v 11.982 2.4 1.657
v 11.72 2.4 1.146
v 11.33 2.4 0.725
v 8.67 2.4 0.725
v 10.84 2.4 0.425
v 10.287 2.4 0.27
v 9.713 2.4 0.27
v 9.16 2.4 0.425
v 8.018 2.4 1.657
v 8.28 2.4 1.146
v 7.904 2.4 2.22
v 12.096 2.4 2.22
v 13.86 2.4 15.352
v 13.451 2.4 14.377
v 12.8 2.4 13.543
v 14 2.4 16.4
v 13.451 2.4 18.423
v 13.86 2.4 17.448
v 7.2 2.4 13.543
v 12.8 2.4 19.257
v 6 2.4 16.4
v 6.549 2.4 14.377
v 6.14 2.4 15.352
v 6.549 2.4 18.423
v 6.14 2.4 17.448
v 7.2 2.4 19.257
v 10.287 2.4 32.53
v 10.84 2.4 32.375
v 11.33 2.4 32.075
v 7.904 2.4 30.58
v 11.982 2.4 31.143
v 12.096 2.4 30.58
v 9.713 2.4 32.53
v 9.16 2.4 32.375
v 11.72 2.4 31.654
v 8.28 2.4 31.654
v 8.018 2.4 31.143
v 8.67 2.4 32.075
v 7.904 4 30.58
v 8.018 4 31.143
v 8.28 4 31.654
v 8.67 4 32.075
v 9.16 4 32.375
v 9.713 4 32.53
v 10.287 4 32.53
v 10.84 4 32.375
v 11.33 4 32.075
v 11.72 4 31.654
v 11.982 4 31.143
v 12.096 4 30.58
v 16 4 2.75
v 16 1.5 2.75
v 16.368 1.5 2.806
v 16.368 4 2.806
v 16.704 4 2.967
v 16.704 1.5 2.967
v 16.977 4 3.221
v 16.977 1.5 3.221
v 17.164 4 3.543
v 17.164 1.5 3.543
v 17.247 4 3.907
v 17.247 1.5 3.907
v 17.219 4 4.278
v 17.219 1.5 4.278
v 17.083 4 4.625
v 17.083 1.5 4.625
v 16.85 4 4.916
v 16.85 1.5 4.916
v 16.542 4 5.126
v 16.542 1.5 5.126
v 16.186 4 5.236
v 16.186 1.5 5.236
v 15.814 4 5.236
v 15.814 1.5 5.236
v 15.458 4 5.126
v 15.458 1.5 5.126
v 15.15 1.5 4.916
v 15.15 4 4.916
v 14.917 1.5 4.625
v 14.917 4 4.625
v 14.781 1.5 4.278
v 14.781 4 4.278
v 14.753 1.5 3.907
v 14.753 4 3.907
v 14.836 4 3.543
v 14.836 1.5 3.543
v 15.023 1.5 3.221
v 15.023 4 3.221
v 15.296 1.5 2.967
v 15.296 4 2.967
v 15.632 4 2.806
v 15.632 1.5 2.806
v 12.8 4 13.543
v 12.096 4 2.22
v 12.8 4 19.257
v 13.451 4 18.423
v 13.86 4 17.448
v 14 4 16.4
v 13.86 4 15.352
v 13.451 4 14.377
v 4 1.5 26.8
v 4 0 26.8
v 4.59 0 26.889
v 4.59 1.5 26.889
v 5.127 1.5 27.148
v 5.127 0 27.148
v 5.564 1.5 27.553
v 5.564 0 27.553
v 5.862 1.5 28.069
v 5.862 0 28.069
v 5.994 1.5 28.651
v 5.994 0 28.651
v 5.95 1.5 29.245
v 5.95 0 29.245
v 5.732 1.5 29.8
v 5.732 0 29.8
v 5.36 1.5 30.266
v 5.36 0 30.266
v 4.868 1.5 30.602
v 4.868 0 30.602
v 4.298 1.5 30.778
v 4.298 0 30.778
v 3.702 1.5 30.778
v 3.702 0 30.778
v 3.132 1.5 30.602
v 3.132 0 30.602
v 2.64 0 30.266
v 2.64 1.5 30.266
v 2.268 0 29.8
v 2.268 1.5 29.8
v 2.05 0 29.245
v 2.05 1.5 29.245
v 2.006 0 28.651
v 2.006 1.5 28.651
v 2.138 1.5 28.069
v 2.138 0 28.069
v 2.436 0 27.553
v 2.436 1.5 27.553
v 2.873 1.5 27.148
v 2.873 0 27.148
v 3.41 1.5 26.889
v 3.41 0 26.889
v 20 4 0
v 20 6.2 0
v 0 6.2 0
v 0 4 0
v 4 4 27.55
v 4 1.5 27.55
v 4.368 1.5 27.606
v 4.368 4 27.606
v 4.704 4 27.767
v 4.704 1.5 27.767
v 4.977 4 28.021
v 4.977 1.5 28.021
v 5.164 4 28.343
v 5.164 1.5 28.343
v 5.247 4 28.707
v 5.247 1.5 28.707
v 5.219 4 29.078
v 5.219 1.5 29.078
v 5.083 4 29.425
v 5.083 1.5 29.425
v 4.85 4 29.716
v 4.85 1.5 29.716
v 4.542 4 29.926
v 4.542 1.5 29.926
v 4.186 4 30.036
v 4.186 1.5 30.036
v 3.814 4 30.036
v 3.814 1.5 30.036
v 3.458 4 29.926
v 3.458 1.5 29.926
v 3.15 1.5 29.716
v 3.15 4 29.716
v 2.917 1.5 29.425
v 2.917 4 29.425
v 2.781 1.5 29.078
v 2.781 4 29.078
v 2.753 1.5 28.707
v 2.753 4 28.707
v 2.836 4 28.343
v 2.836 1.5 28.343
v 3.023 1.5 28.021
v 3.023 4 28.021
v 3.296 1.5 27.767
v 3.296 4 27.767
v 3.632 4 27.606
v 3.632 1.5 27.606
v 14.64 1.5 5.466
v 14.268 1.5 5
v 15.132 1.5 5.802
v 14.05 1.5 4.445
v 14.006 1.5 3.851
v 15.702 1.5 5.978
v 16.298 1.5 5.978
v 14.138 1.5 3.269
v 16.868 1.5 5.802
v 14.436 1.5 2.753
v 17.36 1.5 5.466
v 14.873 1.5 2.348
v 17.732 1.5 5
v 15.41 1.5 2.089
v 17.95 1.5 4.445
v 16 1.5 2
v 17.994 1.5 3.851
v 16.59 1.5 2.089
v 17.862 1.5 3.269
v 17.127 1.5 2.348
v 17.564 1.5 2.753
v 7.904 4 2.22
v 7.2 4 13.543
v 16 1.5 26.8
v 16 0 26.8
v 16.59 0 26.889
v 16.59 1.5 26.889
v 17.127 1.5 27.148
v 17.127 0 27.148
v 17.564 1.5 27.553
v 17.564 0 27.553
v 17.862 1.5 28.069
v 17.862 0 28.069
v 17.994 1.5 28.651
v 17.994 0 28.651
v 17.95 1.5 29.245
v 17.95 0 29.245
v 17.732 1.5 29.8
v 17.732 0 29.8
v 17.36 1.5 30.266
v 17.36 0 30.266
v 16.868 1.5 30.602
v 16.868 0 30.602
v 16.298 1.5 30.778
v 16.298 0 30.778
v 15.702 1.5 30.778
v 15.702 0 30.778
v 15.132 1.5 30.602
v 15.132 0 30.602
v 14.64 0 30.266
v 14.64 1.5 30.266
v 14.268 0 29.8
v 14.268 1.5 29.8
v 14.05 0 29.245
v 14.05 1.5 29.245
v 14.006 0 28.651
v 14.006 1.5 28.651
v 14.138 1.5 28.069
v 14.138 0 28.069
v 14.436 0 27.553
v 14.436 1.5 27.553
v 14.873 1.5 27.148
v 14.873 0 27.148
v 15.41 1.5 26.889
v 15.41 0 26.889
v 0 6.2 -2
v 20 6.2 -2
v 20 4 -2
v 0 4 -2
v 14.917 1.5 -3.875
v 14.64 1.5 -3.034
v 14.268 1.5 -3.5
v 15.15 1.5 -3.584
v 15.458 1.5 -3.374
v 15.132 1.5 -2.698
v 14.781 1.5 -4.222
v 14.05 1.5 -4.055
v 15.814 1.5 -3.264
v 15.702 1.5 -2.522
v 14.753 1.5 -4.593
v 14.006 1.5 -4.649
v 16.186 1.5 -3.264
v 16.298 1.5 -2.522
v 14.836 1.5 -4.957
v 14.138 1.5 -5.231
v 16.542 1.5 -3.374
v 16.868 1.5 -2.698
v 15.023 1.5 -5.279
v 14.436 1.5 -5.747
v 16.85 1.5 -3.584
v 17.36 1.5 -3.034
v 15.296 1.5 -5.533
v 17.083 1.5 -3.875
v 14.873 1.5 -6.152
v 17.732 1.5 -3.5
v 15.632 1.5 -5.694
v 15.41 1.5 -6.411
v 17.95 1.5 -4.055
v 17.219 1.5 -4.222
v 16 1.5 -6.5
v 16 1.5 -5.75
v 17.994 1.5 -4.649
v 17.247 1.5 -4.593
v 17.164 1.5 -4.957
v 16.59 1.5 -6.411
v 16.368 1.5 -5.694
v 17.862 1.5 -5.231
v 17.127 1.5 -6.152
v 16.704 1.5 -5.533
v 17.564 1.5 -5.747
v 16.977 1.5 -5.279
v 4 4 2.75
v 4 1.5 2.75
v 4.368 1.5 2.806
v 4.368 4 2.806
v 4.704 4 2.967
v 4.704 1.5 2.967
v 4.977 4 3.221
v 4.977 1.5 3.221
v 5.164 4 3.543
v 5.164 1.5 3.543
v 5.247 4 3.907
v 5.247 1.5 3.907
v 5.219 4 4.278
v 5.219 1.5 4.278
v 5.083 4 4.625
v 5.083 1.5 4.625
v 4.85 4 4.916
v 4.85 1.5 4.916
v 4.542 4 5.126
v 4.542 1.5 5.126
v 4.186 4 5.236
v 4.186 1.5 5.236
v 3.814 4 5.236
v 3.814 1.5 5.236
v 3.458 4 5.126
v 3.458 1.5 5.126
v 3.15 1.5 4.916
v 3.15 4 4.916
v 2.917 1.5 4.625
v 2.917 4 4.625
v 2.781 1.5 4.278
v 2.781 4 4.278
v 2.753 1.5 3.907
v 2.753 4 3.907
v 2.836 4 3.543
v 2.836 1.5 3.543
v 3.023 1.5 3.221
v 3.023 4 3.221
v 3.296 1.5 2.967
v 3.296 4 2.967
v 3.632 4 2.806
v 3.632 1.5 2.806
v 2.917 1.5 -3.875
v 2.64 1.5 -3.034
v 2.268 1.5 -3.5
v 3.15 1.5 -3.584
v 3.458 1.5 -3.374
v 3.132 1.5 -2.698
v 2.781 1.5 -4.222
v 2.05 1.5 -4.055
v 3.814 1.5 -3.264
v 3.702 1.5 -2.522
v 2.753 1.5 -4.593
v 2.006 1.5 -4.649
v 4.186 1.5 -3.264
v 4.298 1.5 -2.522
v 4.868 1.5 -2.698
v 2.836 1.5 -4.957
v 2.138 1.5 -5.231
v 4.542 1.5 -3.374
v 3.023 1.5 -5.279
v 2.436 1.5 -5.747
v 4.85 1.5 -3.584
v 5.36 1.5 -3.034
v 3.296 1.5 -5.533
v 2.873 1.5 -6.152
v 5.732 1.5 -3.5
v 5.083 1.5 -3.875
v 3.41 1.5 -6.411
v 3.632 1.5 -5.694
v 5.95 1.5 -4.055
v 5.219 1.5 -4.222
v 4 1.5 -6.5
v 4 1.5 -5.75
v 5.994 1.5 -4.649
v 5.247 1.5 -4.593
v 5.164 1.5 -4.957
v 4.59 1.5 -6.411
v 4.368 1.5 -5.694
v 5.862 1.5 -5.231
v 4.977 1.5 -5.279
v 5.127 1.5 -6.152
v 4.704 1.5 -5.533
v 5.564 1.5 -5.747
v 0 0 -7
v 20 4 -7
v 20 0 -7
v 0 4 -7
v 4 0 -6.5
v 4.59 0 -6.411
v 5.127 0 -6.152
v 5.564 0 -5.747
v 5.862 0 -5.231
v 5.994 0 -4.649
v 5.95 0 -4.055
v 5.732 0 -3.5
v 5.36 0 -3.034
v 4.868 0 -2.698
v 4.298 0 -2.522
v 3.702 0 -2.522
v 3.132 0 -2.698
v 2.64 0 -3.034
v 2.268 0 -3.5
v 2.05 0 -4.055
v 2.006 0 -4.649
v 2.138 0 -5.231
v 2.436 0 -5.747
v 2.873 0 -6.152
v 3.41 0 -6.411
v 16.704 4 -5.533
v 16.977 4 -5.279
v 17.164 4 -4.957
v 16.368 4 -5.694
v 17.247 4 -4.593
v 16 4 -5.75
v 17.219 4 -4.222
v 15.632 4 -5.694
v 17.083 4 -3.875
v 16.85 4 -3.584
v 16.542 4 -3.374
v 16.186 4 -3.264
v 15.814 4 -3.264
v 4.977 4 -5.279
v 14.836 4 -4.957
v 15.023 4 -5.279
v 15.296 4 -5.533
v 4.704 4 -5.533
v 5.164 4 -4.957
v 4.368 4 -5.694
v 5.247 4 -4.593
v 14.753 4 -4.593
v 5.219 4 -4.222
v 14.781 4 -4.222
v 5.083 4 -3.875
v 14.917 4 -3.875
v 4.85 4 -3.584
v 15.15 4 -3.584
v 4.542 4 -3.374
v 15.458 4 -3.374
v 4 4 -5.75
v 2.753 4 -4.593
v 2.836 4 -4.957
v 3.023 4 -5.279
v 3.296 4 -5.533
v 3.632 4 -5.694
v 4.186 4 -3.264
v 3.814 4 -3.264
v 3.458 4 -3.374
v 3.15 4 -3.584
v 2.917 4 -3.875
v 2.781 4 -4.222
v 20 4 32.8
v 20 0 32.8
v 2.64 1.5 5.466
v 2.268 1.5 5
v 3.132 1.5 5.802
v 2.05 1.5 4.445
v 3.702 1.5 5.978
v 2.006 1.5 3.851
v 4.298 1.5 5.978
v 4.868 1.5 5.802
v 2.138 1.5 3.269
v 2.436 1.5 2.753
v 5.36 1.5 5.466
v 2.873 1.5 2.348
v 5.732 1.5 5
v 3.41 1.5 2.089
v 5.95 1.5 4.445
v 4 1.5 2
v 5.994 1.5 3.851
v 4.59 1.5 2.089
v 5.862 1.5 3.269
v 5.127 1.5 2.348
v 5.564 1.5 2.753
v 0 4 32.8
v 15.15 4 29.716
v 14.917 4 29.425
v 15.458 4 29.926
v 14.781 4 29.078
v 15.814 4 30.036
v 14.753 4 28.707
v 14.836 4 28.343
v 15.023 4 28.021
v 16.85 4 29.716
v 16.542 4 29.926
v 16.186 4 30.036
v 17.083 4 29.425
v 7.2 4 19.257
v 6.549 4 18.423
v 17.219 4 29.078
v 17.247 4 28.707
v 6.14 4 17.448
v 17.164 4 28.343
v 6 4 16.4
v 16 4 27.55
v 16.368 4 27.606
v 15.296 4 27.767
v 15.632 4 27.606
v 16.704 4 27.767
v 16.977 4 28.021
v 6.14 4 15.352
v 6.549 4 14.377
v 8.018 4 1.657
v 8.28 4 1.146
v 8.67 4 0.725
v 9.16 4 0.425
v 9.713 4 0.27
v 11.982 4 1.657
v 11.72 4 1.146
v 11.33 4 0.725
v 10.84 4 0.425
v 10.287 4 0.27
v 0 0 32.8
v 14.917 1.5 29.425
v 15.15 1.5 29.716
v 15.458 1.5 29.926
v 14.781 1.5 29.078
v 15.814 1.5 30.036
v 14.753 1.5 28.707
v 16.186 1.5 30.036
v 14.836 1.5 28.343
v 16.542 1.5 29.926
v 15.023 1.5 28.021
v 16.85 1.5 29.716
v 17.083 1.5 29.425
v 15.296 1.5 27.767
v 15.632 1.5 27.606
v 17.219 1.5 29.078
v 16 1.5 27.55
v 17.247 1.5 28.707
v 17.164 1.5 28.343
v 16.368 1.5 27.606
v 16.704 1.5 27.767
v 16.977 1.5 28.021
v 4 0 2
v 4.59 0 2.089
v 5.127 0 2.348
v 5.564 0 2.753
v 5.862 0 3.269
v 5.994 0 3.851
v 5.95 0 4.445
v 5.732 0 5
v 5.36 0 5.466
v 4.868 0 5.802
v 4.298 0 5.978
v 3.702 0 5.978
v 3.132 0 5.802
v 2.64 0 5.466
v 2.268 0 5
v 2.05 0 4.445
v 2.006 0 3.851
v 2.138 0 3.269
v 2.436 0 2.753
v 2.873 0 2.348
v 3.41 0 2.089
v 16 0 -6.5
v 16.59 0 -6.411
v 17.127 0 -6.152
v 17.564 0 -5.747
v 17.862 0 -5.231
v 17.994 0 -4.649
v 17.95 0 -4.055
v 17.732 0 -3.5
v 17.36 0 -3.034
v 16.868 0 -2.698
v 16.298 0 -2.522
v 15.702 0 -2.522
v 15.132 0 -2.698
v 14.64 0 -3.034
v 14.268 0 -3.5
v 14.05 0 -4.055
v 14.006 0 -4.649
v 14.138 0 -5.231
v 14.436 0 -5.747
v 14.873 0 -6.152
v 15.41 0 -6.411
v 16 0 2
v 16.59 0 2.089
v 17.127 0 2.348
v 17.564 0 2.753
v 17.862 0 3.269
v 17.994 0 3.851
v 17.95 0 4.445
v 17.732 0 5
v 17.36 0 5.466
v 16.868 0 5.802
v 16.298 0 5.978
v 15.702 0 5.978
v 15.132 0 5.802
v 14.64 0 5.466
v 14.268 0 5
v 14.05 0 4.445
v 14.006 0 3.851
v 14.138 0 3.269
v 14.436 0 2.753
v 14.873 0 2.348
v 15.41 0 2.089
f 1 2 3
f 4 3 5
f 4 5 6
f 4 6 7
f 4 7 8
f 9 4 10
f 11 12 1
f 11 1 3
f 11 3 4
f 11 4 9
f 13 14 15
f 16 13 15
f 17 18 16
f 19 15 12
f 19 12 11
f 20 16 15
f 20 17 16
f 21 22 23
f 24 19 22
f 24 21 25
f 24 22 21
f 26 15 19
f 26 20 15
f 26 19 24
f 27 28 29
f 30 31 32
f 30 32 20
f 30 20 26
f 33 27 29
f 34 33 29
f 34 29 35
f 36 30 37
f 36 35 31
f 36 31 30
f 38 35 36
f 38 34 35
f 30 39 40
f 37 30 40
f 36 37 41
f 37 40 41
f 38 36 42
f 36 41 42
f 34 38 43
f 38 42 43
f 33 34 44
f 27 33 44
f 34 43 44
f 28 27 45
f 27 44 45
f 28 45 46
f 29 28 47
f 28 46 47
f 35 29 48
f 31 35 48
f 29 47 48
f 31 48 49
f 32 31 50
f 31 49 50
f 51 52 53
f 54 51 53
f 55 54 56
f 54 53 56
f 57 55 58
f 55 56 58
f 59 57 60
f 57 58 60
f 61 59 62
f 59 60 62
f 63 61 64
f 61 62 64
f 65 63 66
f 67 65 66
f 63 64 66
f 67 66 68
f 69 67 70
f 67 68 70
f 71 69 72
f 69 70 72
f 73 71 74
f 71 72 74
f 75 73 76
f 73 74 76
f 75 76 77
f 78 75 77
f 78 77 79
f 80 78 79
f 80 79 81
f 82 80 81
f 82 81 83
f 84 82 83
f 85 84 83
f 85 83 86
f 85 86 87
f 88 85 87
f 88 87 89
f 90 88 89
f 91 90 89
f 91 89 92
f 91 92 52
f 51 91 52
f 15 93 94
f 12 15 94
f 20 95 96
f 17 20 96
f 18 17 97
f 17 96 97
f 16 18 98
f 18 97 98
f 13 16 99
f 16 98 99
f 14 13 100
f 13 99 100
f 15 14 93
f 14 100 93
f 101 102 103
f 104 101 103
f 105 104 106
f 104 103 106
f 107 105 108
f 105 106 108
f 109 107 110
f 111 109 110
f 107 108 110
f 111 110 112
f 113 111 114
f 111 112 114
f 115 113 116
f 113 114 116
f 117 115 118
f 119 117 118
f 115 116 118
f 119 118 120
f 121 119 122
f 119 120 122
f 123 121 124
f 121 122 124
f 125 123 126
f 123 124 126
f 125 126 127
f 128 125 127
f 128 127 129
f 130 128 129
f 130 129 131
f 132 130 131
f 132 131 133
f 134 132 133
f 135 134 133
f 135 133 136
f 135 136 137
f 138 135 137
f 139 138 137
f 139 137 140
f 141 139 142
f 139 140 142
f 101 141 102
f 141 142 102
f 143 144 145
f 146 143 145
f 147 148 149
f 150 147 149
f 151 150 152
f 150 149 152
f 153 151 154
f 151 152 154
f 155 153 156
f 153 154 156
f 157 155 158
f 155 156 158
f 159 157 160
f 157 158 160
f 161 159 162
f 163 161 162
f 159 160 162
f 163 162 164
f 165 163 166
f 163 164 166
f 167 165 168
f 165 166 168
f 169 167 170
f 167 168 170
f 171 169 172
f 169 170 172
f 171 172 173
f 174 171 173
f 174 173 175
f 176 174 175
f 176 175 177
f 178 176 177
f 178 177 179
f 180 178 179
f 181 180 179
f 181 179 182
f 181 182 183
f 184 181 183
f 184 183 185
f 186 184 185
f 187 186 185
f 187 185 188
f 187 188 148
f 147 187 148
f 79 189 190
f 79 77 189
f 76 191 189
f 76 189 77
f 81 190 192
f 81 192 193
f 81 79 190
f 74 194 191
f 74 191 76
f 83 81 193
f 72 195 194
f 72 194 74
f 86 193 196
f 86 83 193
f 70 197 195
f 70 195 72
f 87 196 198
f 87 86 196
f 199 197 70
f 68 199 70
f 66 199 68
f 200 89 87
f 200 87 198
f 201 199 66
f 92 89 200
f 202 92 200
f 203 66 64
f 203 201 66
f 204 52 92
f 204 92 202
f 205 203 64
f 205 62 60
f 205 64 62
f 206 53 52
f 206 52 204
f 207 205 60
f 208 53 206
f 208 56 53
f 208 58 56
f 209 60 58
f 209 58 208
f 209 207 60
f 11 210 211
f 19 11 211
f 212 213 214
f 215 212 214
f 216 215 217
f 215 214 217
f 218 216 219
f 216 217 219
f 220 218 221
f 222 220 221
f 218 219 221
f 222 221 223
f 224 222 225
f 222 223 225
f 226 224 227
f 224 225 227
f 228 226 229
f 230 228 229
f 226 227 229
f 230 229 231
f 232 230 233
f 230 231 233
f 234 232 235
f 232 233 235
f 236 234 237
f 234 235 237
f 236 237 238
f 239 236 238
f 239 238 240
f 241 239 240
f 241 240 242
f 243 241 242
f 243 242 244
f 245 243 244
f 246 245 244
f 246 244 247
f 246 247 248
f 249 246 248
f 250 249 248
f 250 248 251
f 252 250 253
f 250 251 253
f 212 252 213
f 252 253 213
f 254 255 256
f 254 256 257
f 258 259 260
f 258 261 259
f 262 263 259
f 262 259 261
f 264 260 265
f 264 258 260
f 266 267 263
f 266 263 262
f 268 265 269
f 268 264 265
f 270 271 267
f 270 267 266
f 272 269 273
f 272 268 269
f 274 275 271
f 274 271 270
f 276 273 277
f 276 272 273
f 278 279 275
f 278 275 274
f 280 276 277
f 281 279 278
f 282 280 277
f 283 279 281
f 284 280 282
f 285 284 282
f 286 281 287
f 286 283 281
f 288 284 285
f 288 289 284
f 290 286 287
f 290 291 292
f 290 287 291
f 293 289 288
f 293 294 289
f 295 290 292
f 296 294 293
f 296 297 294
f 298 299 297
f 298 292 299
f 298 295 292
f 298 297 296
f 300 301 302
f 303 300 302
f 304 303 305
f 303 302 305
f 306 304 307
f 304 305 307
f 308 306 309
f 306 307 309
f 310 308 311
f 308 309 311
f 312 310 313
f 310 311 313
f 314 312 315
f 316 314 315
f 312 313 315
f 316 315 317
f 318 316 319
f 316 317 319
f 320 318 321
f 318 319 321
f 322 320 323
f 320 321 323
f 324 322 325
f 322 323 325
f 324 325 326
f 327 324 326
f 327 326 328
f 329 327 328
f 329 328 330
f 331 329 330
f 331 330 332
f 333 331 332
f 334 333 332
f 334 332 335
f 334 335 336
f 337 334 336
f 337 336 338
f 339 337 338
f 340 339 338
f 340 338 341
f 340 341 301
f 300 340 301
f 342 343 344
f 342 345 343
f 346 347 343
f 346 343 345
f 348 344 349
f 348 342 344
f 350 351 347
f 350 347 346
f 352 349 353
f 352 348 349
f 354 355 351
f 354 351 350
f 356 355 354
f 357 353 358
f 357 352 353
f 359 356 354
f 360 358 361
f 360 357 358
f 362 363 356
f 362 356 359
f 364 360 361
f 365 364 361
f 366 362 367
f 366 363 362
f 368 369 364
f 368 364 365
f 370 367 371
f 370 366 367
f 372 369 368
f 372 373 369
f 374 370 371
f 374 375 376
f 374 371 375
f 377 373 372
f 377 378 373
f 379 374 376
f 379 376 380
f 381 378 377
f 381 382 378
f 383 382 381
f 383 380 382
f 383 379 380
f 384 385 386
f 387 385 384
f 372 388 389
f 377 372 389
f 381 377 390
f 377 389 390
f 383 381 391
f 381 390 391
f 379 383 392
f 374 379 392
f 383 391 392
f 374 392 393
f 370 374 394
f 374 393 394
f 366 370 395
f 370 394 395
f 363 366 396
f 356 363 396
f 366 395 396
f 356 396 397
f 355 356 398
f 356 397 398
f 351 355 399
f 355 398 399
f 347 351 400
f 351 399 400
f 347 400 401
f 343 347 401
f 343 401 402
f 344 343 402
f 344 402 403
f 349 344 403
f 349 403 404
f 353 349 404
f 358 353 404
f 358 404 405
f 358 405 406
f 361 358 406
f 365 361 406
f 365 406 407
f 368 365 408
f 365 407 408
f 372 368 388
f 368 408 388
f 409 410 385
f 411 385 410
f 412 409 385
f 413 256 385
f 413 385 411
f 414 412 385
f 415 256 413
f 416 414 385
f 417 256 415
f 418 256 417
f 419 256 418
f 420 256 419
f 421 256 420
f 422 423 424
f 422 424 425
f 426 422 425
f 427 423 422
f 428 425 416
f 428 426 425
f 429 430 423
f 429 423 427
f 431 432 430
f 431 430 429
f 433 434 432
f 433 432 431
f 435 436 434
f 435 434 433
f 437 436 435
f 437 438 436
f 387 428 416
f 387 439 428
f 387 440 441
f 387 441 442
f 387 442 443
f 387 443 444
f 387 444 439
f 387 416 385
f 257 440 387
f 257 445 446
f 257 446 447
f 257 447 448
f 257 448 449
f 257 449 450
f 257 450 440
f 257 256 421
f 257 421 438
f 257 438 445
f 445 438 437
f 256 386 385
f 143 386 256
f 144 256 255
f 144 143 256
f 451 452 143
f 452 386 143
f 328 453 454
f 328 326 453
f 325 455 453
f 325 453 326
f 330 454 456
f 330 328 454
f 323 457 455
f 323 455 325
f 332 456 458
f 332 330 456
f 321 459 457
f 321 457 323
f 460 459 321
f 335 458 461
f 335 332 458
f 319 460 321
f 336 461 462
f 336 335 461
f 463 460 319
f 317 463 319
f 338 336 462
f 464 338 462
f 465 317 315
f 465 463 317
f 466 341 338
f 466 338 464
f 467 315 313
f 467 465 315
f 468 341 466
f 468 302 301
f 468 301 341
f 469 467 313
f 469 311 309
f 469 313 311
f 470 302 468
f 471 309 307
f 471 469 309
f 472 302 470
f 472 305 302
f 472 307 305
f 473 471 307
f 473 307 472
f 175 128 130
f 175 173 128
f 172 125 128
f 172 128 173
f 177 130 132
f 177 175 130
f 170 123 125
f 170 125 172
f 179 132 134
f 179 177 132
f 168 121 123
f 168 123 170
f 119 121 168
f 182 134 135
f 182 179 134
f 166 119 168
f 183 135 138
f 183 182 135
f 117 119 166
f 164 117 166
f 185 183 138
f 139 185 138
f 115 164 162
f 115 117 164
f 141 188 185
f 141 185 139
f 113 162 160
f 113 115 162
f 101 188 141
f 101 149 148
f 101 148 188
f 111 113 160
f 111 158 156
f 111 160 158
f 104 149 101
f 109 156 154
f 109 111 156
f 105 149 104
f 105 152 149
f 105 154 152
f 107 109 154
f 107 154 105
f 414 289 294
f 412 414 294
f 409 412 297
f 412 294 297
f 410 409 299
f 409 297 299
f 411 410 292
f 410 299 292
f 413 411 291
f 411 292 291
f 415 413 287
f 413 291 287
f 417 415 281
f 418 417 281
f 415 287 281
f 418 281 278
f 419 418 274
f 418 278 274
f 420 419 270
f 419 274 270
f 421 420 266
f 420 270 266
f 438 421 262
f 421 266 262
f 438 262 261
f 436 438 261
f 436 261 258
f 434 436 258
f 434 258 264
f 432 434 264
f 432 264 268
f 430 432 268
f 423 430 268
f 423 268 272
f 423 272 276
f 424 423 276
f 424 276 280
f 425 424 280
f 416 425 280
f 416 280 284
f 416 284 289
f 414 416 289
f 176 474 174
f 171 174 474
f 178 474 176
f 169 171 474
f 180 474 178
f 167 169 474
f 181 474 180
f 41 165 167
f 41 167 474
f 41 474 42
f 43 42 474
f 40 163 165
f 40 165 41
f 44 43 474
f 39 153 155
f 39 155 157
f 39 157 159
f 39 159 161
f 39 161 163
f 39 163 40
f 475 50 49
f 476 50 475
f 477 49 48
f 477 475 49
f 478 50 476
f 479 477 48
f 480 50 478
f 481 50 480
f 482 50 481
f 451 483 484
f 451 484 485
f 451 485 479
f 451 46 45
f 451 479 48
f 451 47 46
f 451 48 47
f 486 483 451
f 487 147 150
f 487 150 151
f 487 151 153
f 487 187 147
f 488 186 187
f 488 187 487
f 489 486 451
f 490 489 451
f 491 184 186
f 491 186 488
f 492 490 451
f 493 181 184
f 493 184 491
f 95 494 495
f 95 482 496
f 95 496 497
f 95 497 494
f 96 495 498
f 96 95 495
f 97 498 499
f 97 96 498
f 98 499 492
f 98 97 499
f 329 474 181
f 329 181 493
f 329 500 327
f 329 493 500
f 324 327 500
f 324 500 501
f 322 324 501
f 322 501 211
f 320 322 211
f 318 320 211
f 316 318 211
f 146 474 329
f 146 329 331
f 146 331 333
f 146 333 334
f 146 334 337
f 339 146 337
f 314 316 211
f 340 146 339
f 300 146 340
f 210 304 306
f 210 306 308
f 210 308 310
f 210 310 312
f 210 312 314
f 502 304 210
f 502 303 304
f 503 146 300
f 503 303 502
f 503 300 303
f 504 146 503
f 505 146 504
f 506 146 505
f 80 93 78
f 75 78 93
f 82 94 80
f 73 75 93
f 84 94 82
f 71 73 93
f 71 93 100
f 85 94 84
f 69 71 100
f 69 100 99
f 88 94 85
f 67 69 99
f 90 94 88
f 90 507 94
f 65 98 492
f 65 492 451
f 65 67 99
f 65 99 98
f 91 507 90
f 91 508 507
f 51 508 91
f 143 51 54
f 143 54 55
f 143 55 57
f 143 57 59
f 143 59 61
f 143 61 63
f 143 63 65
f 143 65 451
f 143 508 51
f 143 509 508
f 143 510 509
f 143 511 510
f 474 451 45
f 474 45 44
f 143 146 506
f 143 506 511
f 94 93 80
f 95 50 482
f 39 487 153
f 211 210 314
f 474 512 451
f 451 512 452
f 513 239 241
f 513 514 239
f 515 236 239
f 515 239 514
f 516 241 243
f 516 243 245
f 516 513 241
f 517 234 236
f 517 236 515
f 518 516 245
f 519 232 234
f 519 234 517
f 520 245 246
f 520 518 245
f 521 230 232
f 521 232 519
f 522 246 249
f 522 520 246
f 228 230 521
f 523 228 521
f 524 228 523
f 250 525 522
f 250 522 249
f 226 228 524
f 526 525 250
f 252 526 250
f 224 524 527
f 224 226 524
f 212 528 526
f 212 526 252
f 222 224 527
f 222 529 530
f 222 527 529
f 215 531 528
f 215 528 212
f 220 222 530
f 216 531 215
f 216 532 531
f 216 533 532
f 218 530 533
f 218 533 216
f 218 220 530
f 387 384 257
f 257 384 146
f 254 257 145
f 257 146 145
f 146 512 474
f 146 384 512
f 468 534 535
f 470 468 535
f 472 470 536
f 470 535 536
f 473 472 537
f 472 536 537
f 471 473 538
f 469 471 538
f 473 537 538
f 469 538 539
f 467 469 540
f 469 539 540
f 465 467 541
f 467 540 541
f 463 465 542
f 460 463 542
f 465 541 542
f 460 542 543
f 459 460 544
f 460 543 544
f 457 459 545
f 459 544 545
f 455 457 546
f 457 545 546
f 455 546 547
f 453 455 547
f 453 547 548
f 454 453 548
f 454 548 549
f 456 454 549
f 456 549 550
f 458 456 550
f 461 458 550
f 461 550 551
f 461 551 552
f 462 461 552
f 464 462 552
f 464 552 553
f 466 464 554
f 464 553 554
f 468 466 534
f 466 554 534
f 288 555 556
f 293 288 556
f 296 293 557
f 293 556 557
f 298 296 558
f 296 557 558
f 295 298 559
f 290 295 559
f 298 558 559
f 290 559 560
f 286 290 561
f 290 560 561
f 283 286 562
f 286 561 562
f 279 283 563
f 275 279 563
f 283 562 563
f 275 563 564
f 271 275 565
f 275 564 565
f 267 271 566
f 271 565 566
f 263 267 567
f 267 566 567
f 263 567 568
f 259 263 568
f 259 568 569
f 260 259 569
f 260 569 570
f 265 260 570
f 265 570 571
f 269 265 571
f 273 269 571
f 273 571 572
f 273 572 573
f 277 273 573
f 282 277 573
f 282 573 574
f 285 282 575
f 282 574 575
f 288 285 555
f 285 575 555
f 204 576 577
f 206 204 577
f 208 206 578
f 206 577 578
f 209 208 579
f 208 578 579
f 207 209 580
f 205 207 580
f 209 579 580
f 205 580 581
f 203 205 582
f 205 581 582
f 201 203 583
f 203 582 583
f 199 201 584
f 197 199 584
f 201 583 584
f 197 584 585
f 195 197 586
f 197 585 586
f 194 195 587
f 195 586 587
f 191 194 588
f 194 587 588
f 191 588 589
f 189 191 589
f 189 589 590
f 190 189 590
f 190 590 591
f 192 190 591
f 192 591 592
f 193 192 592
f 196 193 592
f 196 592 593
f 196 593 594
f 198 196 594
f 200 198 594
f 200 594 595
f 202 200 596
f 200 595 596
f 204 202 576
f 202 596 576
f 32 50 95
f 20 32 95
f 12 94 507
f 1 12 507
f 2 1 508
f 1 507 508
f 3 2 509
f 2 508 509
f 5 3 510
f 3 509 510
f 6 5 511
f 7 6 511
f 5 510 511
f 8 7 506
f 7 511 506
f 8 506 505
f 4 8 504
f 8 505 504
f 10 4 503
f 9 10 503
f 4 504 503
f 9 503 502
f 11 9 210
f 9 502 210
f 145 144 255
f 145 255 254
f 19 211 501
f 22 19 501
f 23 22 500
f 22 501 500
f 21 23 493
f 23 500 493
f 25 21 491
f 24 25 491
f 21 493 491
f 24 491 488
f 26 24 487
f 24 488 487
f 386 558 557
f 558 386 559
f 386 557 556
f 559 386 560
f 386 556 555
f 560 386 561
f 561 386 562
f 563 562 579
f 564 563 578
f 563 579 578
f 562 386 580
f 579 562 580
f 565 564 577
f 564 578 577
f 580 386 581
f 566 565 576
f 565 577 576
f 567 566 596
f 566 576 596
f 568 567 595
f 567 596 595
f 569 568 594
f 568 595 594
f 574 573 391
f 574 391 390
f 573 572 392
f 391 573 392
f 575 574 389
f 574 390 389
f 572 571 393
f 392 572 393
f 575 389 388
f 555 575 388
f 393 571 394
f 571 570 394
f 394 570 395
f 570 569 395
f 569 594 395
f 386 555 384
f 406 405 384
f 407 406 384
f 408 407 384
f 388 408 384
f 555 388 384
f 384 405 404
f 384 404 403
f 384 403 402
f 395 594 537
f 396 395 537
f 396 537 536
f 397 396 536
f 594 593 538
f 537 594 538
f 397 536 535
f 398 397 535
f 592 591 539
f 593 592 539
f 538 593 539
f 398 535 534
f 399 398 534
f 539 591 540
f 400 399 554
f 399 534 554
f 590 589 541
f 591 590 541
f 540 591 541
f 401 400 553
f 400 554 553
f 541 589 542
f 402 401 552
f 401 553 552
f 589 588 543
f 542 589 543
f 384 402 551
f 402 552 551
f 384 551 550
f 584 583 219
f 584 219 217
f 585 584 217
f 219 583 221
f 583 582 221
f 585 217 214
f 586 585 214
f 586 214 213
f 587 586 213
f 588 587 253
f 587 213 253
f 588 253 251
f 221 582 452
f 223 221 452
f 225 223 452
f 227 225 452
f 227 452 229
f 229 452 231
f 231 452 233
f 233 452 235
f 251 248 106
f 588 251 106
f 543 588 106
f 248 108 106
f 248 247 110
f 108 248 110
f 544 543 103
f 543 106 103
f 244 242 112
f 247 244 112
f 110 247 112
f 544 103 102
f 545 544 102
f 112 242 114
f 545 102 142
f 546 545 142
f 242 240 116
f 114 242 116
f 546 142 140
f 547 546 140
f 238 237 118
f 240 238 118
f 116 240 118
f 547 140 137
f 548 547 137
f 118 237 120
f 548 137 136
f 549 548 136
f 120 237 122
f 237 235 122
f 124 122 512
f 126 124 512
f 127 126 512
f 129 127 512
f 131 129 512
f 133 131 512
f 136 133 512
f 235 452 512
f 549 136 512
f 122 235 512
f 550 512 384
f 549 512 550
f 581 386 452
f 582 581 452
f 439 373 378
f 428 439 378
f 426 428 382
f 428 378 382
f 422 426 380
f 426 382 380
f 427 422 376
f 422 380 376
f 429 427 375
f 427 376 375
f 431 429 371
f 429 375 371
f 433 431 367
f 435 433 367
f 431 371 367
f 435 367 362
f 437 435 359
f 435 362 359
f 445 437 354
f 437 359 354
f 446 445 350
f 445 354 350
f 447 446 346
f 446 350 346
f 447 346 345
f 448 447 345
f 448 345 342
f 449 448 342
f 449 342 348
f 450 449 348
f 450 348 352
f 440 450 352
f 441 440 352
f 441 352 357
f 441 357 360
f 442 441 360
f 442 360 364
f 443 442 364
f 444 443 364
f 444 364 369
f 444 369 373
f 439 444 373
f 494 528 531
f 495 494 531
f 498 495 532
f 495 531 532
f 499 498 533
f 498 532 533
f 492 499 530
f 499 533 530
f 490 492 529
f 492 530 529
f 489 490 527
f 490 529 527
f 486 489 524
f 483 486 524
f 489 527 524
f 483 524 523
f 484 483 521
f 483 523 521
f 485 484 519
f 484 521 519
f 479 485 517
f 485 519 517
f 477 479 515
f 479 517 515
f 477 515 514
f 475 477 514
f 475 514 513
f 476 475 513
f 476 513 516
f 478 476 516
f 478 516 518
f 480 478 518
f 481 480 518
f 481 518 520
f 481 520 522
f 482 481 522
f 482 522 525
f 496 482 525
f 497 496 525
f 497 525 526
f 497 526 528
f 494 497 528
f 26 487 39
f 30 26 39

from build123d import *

# Parameters (mm, degrees)
SKETCH_1_W          = 20
SKETCH_1_H          = 32.8
EXTRUDE_1_DEPTH     = 4
CUT_EXTRUDE_1_DEPTH = 1.6
SKETCH_4_R          = 2
CUT_EXTRUDE_2_DEPTH = 1.5
SKETCH_4_3_R        = 1.25
CUT_EXTRUDE_3_DEPTH = 39.624344655
SKETCH_5_W          = 20
SKETCH_5_H          = 6.2
EXTRUDE_4_DEPTH     = 2
EXTRUDE_START       = 2
SKETCH_5_6_W        = 20
SKETCH_5_6_H        = 4
EXTRUDE_5_DEPTH     = 5
SKETCH_6_R          = 1.25
CUT_EXTRUDE_4_DEPTH = 39.913750783
SKETCH_6_3_R        = 2
CUT_EXTRUDE_5_DEPTH = 1.5


with BuildPart() as part:
    # 草图1 → 凸台-拉伸1 (new body)
    with BuildSketch(Plane(origin=(0, 0, 0), x_dir=(1, 0, 0), z_dir=(0, 1, 0))):
        with Locations((10, -16.4)):
            Rectangle(SKETCH_1_W, SKETCH_1_H)
    extrude(amount=EXTRUDE_1_DEPTH)

    # 草图3 → 切除-拉伸1 (cut)
    with BuildSketch(Plane(origin=(0, 4, 0), x_dir=(-1, 0, 0), z_dir=(0, 1, 0))):
        with BuildLine():
            Line((-12.8, 13.543428629), (-12.095952788, 2.219685343))
            ThreePointArc((-12.095952788, 2.219685343), (-10, 0.25), (-7.904047212, 2.219685343))
            Line((-7.904047212, 2.219685343), (-7.2, 13.543428629))
            ThreePointArc((-7.2, 13.543428629), (-6, 16.4), (-7.2, 19.256571371))
            Line((-7.2, 19.256571371), (-7.904047212, 30.580314657))
            ThreePointArc((-7.904047212, 30.580314657), (-10, 32.55), (-12.095952788, 30.580314657))
            Line((-12.095952788, 30.580314657), (-12.8, 19.256571371))
            ThreePointArc((-12.8, 19.256571371), (-14, 16.4), (-12.8, 13.543428629))
        make_face()
    extrude(amount=-CUT_EXTRUDE_1_DEPTH, mode=Mode.SUBTRACT)

    # 草图4 → 切除-拉伸2 (cut)
    with BuildSketch(Plane.XZ):
        with Locations(Location((4, 4, 0), (0, 0, 270))):
            Circle(SKETCH_4_R)
        with Locations(Location((4, 28.8, 0), (0, 0, 270))):
            Circle(SKETCH_4_R)
        with Locations(Location((16, 28.8, 0), (0, 0, 270))):
            Circle(SKETCH_4_R)
        with Locations(Location((16, 4, 0), (0, 0, 270))):
            Circle(SKETCH_4_R)
    extrude(amount=-CUT_EXTRUDE_2_DEPTH, mode=Mode.SUBTRACT)

    # 草图4<3> → 切除-拉伸3 (cut, through all)
    with BuildSketch(Plane.XZ):
        with Locations(Location((4, 4, 0), (0, 0, 270))):
            Circle(SKETCH_4_3_R)
        with Locations(Location((4, 28.8, 0), (0, 0, 270))):
            Circle(SKETCH_4_3_R)
        with Locations(Location((16, 4, 0), (0, 0, 270))):
            Circle(SKETCH_4_3_R)
        with Locations(Location((16, 28.8, 0), (0, 0, 270))):
            Circle(SKETCH_4_3_R)
    extrude(amount=-CUT_EXTRUDE_3_DEPTH, mode=Mode.SUBTRACT)

    # 草图5 → 凸台-拉伸4 (add)
    with BuildSketch(Plane(origin=(0, 0, 0), x_dir=(-1, 0, 0), z_dir=(0, 0, -1))):
        with Locations((-10, 3.1)):
            Rectangle(SKETCH_5_W, SKETCH_5_H)
    extrude(amount=EXTRUDE_4_DEPTH)

    # 草图5<6> → 凸台-拉伸5 (add)
    with BuildSketch(Plane(origin=(0, 0, 0), x_dir=(-1, 0, 0), z_dir=(0, 0, -1)).offset(EXTRUDE_START)):
        with Locations((-10, 2)):
            Rectangle(SKETCH_5_6_W, SKETCH_5_6_H)
    extrude(amount=EXTRUDE_5_DEPTH)

    # 草图6 → 切除-拉伸4 (cut, through all)
    with BuildSketch(Plane.XZ):
        with Locations(Location((4, -4.5, 0), (0, 0, 270))):
            Circle(SKETCH_6_R)
        with Locations(Location((16, -4.5, 0), (0, 0, 270))):
            Circle(SKETCH_6_R)
    extrude(amount=-CUT_EXTRUDE_4_DEPTH, mode=Mode.SUBTRACT)

    # 草图6<3> → 切除-拉伸5 (cut)
    with BuildSketch(Plane.XZ):
        with Locations(Location((4, -4.5, 0), (0, 0, 270))):
            Circle(SKETCH_6_3_R)
        with Locations(Location((16, -4.5, 0), (0, 0, 270))):
            Circle(SKETCH_6_3_R)
    extrude(amount=-CUT_EXTRUDE_5_DEPTH, mode=Mode.SUBTRACT)


solid = part.part
